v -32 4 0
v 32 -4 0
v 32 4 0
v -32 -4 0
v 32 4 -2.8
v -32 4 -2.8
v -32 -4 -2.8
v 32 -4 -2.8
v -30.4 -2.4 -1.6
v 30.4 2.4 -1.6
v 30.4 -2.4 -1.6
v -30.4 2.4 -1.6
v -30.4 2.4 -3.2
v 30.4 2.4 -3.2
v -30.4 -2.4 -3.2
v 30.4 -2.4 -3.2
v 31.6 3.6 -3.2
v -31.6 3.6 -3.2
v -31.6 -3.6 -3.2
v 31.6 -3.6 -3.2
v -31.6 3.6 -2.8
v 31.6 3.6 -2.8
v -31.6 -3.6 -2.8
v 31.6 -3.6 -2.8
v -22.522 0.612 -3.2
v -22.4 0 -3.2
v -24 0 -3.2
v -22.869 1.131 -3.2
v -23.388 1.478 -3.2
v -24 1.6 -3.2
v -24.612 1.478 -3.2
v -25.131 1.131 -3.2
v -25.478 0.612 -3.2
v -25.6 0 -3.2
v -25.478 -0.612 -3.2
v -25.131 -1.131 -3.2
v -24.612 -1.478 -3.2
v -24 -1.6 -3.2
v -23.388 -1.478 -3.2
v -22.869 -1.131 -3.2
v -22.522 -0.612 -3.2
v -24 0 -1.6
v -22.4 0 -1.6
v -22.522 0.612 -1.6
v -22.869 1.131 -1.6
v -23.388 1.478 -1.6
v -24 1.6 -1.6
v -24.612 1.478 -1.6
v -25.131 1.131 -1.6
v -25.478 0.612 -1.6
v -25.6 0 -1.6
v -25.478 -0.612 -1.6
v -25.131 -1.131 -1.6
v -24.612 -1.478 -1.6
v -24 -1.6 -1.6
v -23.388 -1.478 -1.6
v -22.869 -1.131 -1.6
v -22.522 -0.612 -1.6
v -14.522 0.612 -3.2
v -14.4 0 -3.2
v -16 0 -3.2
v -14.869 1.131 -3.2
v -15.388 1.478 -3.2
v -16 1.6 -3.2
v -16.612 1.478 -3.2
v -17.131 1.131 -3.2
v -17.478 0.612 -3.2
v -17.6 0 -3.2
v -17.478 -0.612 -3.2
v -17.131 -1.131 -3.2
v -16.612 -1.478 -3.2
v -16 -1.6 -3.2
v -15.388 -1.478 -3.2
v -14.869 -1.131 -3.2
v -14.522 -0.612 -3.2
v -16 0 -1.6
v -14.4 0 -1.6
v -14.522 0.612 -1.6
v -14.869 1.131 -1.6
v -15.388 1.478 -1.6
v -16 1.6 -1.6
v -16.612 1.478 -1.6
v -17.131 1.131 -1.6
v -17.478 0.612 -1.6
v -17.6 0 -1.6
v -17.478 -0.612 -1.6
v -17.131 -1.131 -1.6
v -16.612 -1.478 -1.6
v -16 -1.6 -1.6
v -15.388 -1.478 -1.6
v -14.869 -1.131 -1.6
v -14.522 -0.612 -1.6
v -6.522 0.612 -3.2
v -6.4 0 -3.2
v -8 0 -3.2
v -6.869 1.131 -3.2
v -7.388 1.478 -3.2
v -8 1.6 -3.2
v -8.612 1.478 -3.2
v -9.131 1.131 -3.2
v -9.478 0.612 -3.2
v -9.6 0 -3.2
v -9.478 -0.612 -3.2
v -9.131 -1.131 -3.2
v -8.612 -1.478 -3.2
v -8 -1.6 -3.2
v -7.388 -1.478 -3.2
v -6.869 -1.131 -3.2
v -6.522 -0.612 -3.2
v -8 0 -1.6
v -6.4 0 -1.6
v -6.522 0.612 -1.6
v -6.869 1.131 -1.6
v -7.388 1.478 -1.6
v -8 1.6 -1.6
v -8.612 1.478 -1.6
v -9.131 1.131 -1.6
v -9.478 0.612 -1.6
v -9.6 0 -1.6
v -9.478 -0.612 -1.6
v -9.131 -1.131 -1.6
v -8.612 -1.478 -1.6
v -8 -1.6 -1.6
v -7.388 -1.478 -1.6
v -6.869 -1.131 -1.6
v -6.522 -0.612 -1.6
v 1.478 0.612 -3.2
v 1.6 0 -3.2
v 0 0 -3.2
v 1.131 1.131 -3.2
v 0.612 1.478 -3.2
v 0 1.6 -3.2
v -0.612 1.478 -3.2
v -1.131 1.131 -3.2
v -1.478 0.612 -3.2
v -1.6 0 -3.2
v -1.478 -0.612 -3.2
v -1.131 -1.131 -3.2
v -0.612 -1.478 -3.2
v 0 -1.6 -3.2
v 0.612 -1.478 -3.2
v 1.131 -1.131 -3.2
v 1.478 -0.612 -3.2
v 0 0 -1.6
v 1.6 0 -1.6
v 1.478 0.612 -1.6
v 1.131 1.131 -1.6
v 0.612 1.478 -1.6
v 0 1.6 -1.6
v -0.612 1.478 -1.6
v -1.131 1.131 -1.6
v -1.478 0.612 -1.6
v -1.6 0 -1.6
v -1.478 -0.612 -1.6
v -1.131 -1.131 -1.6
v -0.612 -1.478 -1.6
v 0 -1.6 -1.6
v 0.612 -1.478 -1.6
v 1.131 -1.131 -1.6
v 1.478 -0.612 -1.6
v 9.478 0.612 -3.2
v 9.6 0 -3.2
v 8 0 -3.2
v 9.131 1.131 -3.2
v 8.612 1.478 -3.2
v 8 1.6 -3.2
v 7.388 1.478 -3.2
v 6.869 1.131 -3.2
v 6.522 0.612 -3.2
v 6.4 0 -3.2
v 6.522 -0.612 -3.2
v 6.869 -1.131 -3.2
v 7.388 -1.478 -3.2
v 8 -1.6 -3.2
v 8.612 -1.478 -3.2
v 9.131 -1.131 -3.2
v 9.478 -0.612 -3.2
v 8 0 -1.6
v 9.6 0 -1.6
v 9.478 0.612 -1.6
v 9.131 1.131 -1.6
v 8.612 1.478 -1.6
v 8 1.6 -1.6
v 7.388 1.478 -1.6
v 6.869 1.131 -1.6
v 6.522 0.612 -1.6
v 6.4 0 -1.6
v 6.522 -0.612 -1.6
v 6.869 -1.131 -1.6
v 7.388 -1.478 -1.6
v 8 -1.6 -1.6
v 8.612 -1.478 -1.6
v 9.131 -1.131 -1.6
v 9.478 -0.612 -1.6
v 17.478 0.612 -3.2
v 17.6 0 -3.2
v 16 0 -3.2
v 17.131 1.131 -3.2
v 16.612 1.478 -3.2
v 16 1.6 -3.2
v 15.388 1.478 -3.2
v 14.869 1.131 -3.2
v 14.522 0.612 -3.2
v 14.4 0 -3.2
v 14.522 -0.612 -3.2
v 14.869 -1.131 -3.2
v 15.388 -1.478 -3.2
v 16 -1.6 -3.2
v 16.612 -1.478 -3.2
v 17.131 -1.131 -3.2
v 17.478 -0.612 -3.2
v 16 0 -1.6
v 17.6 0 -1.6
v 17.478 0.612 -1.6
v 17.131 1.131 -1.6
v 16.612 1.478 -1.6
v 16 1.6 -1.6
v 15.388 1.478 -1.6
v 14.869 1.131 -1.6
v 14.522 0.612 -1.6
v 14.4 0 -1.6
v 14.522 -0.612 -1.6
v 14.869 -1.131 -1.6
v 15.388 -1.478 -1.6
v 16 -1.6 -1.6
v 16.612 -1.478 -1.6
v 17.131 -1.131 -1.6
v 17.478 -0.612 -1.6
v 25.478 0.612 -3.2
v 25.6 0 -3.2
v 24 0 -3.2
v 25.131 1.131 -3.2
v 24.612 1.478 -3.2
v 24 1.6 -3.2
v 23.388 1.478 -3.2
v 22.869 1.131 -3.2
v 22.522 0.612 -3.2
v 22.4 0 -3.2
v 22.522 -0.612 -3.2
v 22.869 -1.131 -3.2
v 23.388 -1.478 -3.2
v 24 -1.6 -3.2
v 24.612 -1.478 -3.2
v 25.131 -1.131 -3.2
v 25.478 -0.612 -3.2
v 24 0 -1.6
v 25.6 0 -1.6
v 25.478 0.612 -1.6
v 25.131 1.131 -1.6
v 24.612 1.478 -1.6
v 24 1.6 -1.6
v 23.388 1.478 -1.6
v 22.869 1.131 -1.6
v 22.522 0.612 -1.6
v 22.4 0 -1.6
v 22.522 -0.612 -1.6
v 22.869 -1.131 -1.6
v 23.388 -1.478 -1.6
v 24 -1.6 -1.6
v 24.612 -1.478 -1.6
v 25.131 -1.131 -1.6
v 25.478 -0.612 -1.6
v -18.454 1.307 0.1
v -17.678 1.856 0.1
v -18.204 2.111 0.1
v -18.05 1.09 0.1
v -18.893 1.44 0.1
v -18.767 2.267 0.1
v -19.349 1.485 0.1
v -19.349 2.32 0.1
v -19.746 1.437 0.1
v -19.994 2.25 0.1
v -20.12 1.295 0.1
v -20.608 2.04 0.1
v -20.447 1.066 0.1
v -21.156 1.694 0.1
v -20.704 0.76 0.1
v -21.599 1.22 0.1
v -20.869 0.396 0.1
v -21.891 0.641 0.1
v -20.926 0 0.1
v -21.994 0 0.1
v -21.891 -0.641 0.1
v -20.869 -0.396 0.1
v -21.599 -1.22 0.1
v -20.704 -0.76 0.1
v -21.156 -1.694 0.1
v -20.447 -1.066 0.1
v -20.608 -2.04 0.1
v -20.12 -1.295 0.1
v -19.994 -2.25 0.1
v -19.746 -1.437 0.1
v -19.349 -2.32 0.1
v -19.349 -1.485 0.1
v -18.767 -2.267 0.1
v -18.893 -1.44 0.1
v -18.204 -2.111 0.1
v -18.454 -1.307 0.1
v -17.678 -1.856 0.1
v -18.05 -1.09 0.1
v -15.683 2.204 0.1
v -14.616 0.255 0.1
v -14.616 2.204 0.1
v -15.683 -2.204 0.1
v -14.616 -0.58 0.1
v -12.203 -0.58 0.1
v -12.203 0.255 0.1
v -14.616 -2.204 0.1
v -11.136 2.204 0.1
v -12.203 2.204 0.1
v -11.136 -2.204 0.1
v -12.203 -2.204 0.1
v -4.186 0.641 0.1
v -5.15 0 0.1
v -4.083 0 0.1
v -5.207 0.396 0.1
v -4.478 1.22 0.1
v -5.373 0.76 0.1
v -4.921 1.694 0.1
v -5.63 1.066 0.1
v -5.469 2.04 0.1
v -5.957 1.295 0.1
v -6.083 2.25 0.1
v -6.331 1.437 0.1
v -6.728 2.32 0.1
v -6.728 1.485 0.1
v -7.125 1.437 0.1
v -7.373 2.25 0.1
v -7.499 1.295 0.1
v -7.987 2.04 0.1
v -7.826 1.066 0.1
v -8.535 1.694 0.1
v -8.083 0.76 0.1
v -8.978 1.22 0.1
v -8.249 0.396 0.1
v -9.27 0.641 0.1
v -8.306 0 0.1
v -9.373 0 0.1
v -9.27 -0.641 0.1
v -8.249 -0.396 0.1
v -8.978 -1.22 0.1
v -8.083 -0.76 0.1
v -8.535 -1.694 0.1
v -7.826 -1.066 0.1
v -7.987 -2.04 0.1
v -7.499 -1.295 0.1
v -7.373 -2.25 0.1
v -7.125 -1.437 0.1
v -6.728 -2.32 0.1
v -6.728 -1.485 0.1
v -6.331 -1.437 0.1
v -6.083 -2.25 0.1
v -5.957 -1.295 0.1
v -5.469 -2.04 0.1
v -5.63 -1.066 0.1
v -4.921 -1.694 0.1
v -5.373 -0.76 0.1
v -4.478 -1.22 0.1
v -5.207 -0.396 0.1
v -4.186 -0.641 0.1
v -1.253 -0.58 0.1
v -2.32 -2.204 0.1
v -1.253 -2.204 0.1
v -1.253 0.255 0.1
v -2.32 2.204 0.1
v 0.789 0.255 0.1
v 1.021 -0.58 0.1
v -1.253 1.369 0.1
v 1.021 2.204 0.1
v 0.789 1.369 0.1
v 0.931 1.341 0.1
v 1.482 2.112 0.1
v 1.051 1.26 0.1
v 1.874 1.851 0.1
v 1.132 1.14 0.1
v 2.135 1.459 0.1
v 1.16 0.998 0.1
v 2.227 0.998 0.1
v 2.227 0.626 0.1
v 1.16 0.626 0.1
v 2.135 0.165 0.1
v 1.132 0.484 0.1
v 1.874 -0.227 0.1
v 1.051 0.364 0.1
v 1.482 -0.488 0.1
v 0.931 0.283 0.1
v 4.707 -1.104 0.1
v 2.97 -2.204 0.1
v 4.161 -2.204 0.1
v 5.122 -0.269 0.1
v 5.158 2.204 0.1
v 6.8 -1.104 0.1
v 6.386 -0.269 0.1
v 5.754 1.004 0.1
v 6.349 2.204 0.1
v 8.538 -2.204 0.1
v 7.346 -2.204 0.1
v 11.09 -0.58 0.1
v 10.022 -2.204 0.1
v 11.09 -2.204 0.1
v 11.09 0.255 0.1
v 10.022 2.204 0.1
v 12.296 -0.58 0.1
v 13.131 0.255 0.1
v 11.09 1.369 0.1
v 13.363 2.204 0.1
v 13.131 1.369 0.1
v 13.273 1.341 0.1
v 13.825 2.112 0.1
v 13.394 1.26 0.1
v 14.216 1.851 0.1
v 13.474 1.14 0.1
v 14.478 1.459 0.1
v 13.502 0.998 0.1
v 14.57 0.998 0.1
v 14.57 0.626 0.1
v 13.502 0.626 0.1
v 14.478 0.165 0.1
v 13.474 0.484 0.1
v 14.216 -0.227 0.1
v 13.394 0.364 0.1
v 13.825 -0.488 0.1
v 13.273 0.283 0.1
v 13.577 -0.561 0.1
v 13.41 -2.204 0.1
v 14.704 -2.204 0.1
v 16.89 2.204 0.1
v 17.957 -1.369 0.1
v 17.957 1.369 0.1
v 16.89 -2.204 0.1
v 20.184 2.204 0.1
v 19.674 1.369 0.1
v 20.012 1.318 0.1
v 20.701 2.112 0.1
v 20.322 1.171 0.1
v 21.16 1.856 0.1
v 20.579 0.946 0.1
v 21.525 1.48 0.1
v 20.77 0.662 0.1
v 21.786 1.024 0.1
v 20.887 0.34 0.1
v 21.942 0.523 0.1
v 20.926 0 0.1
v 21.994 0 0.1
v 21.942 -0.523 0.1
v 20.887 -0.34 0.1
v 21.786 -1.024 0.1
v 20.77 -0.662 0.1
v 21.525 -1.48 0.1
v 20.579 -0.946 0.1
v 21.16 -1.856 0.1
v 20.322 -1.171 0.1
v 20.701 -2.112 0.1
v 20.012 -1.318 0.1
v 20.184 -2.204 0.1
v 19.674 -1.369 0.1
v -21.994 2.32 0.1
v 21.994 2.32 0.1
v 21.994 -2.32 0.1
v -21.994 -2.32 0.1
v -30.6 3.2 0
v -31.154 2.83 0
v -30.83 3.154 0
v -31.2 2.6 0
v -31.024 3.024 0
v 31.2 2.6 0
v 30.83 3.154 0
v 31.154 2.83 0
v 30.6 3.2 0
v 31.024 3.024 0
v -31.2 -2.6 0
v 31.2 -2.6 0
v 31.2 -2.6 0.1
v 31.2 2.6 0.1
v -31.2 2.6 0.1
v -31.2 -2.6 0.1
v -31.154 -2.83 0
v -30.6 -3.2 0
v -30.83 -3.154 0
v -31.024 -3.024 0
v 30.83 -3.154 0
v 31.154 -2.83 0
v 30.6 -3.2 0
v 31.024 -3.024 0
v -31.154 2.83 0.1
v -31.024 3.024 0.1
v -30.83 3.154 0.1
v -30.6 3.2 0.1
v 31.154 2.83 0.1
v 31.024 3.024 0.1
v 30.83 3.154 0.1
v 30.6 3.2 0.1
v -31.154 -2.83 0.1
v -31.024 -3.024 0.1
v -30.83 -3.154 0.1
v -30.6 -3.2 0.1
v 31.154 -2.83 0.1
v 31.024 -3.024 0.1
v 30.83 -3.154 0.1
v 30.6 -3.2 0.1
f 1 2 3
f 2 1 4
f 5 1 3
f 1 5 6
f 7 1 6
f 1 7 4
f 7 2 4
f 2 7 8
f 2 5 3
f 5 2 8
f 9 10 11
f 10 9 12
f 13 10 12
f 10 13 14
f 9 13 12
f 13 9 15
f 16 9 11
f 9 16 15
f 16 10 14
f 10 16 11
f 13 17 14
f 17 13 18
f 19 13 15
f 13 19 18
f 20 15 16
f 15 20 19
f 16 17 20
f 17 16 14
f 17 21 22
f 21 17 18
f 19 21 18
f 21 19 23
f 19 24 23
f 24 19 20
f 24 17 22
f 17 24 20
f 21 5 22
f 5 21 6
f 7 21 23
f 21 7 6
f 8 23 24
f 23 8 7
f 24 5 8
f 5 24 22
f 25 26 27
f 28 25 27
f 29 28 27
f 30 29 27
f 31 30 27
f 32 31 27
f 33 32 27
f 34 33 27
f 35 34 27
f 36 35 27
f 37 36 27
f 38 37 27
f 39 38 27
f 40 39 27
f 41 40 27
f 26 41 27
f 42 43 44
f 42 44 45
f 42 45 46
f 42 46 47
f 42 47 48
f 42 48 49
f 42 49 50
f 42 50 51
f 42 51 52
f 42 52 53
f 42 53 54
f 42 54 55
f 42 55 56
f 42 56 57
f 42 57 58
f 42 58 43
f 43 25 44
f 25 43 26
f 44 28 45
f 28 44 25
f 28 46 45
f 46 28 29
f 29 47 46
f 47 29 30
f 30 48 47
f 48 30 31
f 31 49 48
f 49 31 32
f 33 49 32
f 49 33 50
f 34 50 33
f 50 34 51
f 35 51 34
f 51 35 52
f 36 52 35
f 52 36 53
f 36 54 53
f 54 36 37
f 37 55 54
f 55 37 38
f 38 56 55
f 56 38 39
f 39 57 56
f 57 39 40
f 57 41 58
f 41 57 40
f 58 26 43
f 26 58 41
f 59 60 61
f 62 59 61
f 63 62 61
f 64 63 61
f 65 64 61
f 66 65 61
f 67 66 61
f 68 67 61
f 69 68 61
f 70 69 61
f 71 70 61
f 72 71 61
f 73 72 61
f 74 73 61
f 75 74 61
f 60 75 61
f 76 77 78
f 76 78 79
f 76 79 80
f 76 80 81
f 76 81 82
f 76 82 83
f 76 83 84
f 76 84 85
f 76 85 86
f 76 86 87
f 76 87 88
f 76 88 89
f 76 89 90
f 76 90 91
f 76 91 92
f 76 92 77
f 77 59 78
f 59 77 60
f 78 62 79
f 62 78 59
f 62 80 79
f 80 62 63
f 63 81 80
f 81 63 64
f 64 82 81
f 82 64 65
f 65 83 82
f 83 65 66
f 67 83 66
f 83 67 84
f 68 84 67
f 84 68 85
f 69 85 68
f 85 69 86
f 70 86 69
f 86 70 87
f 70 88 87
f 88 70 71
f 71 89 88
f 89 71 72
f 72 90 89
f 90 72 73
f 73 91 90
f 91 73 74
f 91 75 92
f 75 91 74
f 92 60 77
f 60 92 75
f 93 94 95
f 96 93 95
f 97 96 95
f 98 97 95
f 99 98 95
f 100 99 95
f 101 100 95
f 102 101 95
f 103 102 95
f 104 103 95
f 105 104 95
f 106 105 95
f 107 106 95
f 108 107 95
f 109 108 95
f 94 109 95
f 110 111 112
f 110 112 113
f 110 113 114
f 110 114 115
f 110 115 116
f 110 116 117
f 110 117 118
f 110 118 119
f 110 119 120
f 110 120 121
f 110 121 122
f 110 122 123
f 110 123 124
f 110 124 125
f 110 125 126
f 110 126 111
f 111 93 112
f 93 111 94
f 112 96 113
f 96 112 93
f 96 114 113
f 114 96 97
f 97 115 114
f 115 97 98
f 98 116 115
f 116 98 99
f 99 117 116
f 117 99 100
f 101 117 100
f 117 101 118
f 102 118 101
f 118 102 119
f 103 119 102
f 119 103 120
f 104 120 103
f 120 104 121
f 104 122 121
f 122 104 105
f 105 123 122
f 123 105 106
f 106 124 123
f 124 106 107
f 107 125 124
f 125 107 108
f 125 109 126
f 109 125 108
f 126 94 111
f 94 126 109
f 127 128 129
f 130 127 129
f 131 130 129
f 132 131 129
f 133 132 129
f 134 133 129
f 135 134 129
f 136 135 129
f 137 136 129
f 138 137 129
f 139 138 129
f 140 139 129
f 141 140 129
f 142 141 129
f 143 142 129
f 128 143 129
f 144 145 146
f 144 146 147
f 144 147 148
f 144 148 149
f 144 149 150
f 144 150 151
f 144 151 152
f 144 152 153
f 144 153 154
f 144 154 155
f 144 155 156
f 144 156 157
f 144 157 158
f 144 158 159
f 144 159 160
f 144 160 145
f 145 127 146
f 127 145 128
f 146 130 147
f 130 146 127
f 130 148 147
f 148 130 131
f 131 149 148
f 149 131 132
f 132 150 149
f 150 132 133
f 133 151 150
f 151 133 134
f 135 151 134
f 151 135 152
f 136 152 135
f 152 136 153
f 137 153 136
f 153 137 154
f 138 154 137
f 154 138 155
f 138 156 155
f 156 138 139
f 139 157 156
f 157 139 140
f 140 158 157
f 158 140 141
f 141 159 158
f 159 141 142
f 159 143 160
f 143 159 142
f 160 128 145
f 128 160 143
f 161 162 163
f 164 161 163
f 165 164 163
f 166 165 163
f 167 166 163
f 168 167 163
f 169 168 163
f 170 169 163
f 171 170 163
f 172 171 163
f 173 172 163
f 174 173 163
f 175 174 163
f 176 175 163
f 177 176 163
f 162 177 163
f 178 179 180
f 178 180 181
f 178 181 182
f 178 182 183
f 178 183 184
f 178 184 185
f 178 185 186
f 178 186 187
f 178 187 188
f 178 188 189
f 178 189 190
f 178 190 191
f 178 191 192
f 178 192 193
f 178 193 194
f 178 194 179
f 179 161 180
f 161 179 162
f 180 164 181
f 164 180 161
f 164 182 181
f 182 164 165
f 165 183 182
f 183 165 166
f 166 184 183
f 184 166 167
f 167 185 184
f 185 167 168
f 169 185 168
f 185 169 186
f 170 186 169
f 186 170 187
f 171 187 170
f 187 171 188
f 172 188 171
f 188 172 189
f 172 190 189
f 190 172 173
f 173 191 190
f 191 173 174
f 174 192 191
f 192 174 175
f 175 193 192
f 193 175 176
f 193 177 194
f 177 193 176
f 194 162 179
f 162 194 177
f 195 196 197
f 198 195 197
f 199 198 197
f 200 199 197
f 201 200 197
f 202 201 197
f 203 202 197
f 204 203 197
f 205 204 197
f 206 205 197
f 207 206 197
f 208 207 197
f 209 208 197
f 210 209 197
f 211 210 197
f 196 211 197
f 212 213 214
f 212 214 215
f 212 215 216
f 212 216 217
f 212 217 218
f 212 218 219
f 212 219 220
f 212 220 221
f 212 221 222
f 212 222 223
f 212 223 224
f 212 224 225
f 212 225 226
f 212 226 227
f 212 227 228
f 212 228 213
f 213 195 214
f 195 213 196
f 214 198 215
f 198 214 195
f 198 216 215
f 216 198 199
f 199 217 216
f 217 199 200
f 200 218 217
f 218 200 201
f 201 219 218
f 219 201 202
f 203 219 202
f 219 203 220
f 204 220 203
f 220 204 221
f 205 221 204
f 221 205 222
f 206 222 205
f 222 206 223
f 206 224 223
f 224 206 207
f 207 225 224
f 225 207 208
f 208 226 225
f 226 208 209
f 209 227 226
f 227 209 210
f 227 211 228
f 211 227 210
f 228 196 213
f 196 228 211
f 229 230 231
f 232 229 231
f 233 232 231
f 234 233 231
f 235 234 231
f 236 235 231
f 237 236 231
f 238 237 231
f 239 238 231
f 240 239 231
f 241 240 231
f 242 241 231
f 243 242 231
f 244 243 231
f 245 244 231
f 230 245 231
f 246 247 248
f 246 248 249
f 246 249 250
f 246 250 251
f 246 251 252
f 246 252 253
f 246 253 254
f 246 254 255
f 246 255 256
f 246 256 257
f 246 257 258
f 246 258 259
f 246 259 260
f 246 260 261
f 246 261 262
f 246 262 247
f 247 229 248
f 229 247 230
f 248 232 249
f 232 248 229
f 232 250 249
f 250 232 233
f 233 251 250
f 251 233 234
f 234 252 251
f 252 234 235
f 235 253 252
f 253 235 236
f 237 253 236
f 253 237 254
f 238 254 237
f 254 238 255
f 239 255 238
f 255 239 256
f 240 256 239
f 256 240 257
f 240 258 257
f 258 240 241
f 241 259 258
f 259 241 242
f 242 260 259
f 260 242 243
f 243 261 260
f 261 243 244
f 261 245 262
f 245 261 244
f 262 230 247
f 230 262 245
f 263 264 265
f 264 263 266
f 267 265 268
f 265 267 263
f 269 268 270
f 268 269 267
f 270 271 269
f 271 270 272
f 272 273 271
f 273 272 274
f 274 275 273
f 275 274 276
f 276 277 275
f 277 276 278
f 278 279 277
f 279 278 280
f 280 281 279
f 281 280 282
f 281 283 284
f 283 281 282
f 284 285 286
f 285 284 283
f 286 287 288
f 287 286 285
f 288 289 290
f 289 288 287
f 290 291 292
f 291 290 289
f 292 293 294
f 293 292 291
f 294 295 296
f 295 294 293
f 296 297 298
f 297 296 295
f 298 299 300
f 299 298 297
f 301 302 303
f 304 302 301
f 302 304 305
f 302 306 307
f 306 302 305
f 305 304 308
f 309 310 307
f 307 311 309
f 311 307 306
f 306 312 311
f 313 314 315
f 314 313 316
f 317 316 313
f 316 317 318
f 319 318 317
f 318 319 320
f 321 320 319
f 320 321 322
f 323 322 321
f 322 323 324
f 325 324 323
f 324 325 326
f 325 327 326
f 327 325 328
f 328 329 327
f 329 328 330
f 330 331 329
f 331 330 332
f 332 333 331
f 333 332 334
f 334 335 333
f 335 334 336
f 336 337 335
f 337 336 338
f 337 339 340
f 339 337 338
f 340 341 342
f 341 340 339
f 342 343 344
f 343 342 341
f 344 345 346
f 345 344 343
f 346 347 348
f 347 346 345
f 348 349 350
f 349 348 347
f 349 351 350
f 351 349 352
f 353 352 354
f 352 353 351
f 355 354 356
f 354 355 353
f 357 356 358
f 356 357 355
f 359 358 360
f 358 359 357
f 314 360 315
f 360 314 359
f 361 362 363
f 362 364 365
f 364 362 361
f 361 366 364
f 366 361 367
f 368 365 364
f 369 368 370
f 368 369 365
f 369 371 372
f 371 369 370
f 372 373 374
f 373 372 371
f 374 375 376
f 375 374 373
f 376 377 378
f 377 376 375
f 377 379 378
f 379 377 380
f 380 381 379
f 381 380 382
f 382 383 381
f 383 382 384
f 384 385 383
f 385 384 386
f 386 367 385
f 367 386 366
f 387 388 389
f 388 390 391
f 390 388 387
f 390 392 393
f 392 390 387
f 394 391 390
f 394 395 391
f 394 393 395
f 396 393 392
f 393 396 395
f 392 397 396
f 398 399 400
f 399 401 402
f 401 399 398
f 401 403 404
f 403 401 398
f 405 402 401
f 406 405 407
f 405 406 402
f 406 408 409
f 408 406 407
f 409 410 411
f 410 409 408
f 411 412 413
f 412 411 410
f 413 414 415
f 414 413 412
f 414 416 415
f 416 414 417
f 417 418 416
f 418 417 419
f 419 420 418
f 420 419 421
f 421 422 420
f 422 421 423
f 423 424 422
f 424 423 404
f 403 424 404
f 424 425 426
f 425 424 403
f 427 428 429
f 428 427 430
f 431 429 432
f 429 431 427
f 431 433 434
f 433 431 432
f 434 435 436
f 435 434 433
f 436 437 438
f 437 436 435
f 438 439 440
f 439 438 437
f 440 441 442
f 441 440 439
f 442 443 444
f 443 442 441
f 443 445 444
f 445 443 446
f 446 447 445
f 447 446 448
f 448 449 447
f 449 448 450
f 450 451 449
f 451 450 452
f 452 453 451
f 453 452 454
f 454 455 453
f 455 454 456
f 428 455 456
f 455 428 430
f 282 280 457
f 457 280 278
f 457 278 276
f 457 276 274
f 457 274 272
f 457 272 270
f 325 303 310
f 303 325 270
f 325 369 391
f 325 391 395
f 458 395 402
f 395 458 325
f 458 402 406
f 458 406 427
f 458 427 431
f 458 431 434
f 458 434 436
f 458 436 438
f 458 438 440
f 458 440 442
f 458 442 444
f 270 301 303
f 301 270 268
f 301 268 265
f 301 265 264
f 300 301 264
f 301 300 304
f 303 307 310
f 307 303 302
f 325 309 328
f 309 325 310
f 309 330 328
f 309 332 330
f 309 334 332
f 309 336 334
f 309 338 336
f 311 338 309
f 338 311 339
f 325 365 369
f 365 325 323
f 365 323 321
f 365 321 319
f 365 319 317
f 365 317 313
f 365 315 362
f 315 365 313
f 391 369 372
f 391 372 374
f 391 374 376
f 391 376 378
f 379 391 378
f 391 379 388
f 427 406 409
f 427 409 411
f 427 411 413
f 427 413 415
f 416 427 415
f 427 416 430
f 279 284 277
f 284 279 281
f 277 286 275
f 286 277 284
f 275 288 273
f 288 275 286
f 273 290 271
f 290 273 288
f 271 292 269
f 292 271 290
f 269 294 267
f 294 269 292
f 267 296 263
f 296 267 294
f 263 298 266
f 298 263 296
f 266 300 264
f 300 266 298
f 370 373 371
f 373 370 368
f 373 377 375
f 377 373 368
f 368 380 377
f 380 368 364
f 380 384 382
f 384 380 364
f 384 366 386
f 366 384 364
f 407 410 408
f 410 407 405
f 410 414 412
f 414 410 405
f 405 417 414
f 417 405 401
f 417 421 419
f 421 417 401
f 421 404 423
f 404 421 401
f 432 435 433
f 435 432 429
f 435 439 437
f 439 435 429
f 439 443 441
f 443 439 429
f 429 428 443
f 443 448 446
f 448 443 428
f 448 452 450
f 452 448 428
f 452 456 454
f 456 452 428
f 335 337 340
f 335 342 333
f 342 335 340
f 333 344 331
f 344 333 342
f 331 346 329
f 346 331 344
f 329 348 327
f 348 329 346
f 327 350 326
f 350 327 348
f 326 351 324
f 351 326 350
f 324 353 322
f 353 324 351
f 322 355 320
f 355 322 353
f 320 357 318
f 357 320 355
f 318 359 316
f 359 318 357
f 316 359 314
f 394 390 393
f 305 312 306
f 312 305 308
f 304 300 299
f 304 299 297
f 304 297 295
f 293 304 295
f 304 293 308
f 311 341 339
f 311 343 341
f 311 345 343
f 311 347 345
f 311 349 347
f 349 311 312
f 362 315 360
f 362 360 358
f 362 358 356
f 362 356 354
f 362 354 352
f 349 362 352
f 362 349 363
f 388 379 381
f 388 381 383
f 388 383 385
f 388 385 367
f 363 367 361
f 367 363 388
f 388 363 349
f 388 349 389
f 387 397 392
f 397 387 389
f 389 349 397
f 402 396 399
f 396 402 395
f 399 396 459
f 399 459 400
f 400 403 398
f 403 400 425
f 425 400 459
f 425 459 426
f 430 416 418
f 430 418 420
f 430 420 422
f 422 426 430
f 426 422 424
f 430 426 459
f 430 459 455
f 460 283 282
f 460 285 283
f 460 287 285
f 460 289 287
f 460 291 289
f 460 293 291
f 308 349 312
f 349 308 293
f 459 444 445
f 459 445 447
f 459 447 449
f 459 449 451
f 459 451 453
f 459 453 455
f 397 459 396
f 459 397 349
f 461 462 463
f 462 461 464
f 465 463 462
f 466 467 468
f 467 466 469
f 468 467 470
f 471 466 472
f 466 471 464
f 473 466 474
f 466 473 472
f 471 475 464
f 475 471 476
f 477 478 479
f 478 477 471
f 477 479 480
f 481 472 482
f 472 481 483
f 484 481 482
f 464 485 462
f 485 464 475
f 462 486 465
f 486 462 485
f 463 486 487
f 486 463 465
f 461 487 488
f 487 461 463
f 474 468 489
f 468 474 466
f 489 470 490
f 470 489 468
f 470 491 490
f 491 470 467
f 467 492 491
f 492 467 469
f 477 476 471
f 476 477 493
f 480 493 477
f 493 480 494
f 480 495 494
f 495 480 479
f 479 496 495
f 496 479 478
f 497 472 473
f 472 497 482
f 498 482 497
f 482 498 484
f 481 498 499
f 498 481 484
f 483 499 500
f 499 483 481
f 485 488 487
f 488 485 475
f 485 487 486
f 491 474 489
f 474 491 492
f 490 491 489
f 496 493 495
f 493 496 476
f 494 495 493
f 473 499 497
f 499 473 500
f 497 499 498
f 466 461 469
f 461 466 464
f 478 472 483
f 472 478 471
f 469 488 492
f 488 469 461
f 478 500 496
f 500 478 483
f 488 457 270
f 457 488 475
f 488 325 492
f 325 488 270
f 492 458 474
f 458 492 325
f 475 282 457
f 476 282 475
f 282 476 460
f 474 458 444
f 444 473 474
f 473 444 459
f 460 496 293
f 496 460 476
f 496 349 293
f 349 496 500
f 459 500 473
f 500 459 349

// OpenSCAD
use <../lib.scad>
use <4162.scad>
use <6148328j.scad>
function ldraw_lib__4162d0e() = [
// 0 Tile  1 x  8 with White Chopard Logo on Dark Grey Background Sticker
// 0 Name: 4162d0e.dat
// 0 Author: Vincent Messenet [Cheenzo]
// 0 !LDRAW_ORG Shortcut UPDATE 2026-05
// 0 !LICENSE Licensed under CC BY 4.0 : see CAreadme.txt
// 
// 0 BFC CERTIFY CCW
  [0,"BFC","CERTIFY"],
  [0,"BFC","CCW"],
// 
// 0 !CATEGORY Sticker Shortcut
// 
// 0 !KEYWORDS Bricklink 4162pb197, Porsche 919 Hybrid and 917K Pit Lane, set 75876
// 0 !KEYWORDS Speed Champions
// 
// 0 !HISTORY 2026-05-31 [OrionP] Official Update 2026-05
// 
// 1 16 0 0 0 1 0 0 0 1 0 0 0 1 4162.dat
  [1,16,0,0,0,1,0,0,0,1,0,0,0,1, ldraw_lib__4162()],
// 1 16 0 0 0 1 0 0 0 1 0 0 0 1 6148328j.dat
  [1,16,0,0,0,1,0,0,0,1,0,0,0,1, ldraw_lib__6148328j()],
];
module ldraw_lib__4162d0e(step=0, col=false, unit=2/5, alt=false, line=0.2, solid=!$preview)
    makepoly(ldraw_lib__4162d0e(), step=step, col=col, unit=unit, alt=alt, line=line, solid=solid);
ldraw_lib__4162d0e(line=0.2);
